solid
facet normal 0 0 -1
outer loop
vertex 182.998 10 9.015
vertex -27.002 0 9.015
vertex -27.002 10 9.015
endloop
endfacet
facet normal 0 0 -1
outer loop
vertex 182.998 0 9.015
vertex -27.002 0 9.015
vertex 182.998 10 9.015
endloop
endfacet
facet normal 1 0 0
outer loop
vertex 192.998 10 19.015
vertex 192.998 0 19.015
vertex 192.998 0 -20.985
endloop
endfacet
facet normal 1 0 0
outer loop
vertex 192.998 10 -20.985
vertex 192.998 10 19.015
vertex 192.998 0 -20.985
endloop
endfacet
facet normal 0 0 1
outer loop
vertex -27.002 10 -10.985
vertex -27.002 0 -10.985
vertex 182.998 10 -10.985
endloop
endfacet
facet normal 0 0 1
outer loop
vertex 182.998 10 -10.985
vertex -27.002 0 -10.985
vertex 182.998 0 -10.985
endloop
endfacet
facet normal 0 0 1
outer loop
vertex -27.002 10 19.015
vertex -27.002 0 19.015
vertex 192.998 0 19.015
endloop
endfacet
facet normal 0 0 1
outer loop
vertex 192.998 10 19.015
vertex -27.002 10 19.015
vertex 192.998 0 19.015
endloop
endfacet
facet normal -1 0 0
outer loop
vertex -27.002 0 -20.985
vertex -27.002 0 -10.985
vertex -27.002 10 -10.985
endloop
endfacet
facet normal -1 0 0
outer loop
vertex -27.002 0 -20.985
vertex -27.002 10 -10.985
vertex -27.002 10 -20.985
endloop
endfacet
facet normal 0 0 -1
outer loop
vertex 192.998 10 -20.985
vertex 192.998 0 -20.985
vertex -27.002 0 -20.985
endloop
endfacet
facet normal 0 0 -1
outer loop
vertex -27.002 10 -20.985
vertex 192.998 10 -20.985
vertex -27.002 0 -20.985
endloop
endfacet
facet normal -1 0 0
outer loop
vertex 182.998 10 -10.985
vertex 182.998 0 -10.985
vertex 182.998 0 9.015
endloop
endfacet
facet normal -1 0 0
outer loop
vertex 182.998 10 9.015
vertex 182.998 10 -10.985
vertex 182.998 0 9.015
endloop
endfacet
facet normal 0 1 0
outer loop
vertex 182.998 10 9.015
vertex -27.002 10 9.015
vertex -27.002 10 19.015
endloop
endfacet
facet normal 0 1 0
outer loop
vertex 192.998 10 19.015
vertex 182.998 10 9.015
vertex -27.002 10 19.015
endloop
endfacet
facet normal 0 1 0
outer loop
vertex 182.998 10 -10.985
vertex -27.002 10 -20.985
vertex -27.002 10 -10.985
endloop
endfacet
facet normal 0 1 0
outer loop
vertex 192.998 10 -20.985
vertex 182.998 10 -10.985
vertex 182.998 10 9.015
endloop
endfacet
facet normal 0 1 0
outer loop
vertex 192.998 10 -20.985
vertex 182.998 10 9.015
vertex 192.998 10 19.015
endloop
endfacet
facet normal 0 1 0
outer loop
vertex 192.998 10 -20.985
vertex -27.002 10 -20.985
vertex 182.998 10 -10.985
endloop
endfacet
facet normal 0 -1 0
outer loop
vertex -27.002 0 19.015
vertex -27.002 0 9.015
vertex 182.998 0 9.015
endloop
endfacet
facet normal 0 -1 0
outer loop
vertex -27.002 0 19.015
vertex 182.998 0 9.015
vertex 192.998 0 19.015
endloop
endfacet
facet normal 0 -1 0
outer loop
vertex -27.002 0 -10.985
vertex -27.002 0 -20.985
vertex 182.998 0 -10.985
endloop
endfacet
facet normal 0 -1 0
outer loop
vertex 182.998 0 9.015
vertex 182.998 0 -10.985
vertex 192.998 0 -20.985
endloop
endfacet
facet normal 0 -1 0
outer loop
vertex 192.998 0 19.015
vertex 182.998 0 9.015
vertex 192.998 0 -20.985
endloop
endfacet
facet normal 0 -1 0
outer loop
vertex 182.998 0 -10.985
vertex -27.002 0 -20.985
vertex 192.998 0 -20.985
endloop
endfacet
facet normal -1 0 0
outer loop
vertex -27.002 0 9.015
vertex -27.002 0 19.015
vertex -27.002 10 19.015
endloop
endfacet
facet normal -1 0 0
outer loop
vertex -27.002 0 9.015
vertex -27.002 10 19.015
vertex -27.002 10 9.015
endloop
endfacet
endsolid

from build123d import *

# Parameters (mm, degrees)
SKETCH1_W           = 210
SKETCH1_H           = 10
BOSS_EXTRUDE1_DEPTH = 10


with BuildPart() as part:
    # Sketch1 → Boss-Extrude1 (new body)
    with BuildSketch(Plane(origin=(0, 0, 0), x_dir=(1, 0, 0), z_dir=(0, 1, 0))):
        with Locations((77.998094374, -14.015426497)):
            Rectangle(SKETCH1_W, SKETCH1_H)
        Polygon((192.998094374, 20.984573503), (182.998094374, 20.984573503), (182.998094374, 10.984573503), (182.998094374, -9.015426497), (182.998094374, -19.015426497), (192.998094374, -19.015426497), align=None)
        with Locations((77.998094374, 15.984573503)):
            Rectangle(SKETCH1_W, SKETCH1_H)
    extrude(amount=BOSS_EXTRUDE1_DEPTH)


solid = part.part
